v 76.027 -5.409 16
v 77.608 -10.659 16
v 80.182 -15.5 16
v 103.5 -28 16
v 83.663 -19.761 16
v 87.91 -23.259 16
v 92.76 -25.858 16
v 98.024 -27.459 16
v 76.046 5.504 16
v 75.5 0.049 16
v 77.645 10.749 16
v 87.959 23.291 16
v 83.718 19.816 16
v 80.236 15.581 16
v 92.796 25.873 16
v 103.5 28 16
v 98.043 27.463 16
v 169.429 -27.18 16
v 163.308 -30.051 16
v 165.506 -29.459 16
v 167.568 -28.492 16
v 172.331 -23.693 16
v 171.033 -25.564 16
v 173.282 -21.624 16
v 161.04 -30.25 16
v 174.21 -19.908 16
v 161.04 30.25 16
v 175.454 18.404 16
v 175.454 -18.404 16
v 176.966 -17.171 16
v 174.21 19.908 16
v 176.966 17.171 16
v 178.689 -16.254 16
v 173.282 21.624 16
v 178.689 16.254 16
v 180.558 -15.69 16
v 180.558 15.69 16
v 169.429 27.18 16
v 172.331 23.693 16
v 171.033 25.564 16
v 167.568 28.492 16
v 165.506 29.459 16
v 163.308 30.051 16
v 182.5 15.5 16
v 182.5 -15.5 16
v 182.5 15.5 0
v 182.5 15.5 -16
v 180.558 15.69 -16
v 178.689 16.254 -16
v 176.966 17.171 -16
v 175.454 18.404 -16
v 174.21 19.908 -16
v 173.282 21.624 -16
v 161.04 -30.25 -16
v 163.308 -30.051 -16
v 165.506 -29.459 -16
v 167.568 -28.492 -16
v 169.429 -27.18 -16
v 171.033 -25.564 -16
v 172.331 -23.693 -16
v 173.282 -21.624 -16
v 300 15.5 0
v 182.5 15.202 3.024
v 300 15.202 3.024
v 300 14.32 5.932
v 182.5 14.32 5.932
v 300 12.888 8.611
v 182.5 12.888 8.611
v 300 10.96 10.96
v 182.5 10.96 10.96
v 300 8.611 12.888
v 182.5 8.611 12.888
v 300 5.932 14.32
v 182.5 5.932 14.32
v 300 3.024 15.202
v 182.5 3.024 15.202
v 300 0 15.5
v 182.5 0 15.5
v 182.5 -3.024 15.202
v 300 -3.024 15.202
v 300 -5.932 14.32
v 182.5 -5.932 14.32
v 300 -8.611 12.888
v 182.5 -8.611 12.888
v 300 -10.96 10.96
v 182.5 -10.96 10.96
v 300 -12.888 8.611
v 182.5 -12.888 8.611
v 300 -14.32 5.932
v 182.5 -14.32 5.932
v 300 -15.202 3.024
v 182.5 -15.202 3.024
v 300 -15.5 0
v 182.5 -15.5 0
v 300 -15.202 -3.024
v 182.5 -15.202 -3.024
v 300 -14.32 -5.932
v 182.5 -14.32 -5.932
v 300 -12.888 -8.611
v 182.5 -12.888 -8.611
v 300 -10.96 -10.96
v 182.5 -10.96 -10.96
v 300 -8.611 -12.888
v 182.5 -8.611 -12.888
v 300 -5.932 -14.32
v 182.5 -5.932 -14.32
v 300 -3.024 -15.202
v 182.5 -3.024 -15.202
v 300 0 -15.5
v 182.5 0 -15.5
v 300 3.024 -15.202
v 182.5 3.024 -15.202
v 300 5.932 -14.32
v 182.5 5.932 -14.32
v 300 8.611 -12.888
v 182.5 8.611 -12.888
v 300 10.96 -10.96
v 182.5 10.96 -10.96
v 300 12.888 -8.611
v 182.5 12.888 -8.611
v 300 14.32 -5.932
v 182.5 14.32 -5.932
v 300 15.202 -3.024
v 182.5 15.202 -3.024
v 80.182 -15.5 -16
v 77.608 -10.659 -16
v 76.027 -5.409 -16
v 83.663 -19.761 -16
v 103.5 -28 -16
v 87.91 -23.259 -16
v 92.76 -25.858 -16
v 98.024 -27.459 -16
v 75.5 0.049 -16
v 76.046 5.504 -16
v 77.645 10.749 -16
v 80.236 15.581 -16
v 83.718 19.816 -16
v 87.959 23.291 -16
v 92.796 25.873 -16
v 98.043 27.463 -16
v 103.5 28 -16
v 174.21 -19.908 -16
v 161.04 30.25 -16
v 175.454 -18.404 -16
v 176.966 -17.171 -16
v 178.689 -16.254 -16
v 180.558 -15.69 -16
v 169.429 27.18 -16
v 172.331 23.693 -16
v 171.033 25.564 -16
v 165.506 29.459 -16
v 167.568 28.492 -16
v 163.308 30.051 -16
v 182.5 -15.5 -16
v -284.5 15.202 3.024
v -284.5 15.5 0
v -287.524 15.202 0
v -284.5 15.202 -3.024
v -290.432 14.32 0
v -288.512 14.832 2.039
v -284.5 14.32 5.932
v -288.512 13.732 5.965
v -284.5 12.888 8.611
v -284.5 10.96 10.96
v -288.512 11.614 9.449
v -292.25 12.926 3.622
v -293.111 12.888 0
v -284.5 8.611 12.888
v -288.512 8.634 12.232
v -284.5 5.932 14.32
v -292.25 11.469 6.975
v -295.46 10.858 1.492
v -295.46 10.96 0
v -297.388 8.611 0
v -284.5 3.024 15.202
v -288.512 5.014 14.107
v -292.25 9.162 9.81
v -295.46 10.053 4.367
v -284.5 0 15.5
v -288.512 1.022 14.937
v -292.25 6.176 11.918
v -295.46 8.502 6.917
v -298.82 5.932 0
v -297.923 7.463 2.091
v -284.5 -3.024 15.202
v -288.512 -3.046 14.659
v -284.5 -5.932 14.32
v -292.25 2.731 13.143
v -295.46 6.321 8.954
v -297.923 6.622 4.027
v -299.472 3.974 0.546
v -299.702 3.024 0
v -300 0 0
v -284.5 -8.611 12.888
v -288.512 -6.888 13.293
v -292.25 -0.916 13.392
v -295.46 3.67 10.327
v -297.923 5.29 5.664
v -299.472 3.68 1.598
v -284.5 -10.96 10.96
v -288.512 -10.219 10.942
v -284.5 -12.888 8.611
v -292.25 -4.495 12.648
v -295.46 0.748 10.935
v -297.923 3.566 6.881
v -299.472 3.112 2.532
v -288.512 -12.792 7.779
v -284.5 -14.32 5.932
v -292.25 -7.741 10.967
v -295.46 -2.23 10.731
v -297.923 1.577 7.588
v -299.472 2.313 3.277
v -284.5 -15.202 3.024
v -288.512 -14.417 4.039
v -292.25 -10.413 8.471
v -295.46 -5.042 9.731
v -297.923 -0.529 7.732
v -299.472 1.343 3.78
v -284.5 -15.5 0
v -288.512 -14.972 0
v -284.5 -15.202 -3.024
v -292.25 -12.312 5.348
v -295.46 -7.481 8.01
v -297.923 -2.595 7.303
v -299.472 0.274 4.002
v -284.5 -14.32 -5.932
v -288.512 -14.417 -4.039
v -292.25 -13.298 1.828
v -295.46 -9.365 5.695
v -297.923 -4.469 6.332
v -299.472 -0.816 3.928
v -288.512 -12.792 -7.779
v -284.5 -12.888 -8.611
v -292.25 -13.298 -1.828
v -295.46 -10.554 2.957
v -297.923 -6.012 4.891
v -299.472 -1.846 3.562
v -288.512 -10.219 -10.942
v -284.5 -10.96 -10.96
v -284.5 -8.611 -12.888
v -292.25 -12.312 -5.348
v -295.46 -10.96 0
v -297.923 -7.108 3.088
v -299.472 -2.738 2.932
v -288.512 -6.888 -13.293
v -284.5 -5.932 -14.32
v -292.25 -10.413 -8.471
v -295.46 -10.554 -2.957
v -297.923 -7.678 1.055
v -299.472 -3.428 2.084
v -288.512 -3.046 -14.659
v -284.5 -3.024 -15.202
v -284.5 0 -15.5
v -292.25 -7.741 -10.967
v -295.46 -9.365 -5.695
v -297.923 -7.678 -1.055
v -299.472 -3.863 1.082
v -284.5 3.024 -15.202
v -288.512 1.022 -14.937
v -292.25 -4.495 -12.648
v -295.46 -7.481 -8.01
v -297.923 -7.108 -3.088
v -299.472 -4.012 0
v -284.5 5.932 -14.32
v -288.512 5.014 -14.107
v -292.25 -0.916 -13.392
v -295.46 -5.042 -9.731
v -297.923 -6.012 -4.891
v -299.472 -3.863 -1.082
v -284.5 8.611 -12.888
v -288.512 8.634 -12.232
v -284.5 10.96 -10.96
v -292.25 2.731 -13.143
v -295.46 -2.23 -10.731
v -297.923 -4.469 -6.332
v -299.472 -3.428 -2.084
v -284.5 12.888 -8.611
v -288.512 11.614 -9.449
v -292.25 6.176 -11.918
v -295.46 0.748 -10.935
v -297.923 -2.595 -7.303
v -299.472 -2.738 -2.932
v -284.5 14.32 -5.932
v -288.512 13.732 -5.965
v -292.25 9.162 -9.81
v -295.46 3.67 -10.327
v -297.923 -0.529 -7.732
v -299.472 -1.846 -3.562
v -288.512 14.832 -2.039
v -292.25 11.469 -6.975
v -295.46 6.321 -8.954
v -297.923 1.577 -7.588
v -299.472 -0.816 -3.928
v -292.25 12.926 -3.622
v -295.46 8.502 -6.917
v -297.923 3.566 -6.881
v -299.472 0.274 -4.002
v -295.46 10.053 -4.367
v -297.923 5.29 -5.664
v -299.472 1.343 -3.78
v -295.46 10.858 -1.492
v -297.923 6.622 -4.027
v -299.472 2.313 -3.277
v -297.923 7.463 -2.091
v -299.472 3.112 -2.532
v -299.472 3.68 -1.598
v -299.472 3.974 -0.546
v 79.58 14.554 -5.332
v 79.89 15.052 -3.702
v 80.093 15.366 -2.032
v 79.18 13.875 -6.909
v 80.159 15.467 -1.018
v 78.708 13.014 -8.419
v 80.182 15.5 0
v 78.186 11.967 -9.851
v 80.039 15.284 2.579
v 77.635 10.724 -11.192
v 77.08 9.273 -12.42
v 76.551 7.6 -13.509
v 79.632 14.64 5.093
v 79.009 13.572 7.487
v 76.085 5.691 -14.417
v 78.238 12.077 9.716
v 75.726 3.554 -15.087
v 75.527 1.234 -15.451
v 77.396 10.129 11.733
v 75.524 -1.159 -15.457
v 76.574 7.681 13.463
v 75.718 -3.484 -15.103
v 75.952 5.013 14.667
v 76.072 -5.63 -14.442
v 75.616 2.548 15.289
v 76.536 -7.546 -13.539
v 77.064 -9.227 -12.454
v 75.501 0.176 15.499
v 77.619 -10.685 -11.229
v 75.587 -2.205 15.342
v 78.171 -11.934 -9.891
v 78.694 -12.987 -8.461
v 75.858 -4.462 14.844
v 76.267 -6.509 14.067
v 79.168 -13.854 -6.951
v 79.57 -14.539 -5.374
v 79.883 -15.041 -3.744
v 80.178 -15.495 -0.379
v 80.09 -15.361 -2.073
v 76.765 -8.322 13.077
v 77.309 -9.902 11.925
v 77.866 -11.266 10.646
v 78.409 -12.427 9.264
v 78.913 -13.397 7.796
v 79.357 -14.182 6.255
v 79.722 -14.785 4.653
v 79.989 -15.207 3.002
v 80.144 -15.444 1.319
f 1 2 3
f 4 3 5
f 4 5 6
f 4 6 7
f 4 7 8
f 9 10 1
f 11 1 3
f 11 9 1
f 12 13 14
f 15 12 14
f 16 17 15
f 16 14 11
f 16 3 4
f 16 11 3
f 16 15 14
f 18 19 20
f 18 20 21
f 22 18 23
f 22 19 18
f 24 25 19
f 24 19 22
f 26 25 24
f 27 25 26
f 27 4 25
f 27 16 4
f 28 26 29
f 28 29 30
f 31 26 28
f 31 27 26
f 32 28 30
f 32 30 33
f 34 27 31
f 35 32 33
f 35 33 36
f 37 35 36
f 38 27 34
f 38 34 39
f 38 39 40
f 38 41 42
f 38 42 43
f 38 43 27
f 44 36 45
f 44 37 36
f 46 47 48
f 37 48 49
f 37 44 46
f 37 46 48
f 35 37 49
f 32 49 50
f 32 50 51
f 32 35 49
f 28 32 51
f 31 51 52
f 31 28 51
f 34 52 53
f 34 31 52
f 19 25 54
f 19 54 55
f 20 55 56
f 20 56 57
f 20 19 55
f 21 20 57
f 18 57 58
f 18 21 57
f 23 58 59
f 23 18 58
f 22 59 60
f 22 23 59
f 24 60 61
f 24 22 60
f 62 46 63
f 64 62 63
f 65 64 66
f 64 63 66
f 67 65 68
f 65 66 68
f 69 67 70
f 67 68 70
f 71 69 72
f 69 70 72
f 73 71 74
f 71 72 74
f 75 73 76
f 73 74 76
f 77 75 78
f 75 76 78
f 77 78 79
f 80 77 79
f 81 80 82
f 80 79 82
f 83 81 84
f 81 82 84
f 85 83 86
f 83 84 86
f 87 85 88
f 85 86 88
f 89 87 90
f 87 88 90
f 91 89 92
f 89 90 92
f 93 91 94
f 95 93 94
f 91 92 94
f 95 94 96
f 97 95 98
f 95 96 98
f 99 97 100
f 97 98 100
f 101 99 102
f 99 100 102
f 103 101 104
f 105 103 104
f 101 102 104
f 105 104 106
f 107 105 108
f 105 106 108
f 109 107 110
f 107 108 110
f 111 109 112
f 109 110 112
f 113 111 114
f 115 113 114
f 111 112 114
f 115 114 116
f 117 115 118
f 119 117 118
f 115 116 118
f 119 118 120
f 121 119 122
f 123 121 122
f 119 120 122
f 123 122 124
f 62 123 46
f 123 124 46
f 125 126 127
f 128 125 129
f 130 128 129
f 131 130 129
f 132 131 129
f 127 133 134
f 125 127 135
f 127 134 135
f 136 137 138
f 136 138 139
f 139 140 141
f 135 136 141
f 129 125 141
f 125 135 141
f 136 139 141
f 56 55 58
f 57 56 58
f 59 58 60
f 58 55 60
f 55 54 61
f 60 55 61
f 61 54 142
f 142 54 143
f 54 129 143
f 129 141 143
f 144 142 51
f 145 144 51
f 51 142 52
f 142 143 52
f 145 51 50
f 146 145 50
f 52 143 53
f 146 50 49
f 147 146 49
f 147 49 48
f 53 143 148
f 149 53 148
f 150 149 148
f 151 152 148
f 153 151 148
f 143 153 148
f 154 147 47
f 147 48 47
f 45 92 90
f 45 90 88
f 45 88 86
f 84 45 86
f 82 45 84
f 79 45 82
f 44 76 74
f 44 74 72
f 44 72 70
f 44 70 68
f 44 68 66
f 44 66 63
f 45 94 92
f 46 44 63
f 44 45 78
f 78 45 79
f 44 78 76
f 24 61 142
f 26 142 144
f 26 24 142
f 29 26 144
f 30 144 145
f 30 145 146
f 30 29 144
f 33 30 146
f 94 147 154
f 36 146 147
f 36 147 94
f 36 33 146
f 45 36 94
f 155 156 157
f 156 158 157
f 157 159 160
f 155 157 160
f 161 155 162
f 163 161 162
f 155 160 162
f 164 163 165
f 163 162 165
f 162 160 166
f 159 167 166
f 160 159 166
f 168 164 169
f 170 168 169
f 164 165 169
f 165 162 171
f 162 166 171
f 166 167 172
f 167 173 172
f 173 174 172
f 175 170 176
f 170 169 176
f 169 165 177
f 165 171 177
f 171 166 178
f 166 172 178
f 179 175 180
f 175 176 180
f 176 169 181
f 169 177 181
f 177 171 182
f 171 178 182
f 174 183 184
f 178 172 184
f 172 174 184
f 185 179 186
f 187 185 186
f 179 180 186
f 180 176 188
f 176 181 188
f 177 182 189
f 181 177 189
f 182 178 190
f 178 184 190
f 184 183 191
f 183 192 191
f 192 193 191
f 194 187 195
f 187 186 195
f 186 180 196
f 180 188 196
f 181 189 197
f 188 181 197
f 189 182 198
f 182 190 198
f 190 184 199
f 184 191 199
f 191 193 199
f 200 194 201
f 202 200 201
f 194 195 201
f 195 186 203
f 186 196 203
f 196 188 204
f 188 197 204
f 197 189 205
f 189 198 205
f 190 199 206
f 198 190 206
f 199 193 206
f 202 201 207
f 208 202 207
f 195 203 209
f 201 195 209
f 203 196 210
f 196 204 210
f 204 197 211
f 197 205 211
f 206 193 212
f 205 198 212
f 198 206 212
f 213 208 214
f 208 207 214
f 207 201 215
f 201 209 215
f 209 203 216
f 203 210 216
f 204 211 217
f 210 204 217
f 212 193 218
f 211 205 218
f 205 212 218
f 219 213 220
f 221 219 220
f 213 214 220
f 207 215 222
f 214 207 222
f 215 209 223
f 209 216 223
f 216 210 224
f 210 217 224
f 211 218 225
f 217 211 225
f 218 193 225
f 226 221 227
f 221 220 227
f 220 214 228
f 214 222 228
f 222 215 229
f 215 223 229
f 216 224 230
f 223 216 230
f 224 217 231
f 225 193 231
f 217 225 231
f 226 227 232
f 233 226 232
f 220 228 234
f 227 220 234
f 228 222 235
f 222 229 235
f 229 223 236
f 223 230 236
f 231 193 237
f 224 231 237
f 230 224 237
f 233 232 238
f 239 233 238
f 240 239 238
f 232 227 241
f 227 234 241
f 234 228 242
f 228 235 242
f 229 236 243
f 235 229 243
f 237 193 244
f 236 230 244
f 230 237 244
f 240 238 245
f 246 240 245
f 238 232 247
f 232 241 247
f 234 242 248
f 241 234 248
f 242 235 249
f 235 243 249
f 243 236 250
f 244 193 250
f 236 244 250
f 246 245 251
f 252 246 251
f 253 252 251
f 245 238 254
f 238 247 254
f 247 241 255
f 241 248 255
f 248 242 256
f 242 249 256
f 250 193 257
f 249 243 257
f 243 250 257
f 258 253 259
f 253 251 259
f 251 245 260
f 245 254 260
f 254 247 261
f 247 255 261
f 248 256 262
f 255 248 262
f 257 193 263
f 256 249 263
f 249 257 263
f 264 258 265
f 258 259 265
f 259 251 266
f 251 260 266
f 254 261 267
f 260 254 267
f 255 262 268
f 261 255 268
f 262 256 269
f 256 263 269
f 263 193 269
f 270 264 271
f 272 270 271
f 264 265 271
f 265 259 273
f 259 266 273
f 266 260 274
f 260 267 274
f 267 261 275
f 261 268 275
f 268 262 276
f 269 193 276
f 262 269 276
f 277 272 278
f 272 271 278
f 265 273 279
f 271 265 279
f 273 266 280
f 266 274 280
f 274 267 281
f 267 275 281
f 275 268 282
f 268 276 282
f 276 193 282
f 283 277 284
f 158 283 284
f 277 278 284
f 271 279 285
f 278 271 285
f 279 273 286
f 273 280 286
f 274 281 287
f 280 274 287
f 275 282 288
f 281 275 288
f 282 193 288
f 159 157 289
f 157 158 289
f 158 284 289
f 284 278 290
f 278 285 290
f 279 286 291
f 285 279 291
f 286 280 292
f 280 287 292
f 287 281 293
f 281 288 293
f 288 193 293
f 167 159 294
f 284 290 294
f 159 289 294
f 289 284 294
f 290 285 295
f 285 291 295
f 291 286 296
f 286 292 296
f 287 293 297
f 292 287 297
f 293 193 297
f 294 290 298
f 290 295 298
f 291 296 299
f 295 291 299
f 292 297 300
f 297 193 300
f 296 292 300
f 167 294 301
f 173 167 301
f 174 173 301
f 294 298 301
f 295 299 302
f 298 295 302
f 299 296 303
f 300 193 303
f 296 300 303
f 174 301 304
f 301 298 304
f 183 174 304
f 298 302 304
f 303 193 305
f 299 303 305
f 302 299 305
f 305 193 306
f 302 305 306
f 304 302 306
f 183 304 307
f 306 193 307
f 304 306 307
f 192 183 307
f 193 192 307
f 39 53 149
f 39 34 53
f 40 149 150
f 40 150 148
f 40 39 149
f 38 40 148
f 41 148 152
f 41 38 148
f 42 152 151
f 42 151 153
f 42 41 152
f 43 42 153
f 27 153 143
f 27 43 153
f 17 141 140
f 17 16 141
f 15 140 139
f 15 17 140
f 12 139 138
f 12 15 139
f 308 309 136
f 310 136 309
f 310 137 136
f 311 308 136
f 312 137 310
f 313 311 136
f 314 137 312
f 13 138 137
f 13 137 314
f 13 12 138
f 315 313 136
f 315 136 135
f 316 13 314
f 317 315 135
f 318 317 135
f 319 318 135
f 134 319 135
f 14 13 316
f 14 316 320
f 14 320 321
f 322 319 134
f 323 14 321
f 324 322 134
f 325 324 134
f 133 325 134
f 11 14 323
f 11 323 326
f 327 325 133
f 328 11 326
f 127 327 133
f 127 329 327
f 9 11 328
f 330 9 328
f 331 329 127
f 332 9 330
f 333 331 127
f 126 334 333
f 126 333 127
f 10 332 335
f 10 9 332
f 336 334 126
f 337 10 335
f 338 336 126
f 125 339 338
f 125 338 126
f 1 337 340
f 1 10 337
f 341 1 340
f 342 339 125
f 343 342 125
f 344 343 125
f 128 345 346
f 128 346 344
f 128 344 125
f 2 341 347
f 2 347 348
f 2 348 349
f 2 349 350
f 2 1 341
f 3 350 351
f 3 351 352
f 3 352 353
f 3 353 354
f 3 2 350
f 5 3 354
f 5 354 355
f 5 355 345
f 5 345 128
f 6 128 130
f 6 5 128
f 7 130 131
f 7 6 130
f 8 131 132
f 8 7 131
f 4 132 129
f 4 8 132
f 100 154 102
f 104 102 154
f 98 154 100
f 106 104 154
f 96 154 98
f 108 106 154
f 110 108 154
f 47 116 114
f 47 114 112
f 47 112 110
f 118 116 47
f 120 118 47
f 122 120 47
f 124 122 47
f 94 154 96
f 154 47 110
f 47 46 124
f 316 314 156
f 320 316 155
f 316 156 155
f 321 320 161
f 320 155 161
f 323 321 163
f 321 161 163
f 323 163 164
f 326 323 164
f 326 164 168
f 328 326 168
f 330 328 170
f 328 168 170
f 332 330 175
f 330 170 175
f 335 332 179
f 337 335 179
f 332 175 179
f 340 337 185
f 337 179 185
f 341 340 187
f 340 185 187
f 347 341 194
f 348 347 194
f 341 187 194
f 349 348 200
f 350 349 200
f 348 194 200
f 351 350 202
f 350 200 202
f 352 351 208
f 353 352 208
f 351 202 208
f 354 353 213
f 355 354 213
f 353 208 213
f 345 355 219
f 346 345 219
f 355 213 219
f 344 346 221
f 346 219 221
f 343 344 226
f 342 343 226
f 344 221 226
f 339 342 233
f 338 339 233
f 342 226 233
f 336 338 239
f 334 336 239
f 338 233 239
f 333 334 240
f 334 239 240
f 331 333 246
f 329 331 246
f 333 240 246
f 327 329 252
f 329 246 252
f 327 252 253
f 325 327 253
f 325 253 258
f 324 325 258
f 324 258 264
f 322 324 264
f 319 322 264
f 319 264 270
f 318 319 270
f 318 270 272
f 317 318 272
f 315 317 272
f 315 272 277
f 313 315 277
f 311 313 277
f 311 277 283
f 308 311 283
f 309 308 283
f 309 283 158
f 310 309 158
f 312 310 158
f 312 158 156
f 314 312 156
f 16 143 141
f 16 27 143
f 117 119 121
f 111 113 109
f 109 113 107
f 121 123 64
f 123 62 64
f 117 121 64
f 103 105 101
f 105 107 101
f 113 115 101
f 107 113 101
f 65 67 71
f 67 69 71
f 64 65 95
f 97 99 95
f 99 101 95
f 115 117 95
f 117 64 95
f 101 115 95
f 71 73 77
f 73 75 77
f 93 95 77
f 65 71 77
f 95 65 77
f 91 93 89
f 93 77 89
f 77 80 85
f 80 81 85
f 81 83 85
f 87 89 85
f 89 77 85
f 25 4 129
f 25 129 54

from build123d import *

# Parameters (mm, degrees)
SALIENTE_EXTRUIR1_DEPTH = 16


with BuildPart() as part:
    # Croquis1 → Revolución1 (revolve)
    with BuildSketch(Plane.XY):
        with BuildLine():
            Line((-300, 0), (300, 0))
            Line((300, 0), (300, 15.5))
            Line((300, 15.5), (-284.5, 15.5))
            ThreePointArc((-284.5, 15.5), (-295.460155108, 10.960155108), (-300, 0))
        make_face()
    revolve(axis=Axis((-657.792003839, 0, 0), (1, 0, 0)))

    # Croquis3 → Saliente-Extruir1 (add, symmetric)
    with BuildSketch(Plane.XY):
        with BuildLine():
            ThreePointArc((103.5, 28), (78.822074641, 13.228756555), (80.181552367, -15.5))
            Line((80.181552367, -15.5), (182.5, -15.5))
            Line((182.5, -15.5), (182.5, 15.5))
            ThreePointArc((182.5, 15.5), (176.96634932, 17.170611658), (173.281614908, 21.624257969))
            ThreePointArc((173.281614908, 21.624257969), (168.527455009, 27.876978724), (161.039643366, 30.25))
            Line((161.039643366, 30.25), (103.5, 28))
        make_face()
        with BuildLine():
            ThreePointArc((80.181552367, -15.5), (90.271243445, -24.677925359), (103.5, -28))
            Line((103.5, -28), (161.039643366, -30.25))
            ThreePointArc((161.039643366, -30.25), (168.527455009, -27.876978724), (173.281614908, -21.624257969))
            ThreePointArc((173.281614908, -21.624257969), (176.96634932, -17.170611658), (182.5, -15.5))
            Line((182.5, -15.5), (80.181552367, -15.5))
        make_face()
    extrude(amount=SALIENTE_EXTRUIR1_DEPTH, both=True)


solid = part.part
